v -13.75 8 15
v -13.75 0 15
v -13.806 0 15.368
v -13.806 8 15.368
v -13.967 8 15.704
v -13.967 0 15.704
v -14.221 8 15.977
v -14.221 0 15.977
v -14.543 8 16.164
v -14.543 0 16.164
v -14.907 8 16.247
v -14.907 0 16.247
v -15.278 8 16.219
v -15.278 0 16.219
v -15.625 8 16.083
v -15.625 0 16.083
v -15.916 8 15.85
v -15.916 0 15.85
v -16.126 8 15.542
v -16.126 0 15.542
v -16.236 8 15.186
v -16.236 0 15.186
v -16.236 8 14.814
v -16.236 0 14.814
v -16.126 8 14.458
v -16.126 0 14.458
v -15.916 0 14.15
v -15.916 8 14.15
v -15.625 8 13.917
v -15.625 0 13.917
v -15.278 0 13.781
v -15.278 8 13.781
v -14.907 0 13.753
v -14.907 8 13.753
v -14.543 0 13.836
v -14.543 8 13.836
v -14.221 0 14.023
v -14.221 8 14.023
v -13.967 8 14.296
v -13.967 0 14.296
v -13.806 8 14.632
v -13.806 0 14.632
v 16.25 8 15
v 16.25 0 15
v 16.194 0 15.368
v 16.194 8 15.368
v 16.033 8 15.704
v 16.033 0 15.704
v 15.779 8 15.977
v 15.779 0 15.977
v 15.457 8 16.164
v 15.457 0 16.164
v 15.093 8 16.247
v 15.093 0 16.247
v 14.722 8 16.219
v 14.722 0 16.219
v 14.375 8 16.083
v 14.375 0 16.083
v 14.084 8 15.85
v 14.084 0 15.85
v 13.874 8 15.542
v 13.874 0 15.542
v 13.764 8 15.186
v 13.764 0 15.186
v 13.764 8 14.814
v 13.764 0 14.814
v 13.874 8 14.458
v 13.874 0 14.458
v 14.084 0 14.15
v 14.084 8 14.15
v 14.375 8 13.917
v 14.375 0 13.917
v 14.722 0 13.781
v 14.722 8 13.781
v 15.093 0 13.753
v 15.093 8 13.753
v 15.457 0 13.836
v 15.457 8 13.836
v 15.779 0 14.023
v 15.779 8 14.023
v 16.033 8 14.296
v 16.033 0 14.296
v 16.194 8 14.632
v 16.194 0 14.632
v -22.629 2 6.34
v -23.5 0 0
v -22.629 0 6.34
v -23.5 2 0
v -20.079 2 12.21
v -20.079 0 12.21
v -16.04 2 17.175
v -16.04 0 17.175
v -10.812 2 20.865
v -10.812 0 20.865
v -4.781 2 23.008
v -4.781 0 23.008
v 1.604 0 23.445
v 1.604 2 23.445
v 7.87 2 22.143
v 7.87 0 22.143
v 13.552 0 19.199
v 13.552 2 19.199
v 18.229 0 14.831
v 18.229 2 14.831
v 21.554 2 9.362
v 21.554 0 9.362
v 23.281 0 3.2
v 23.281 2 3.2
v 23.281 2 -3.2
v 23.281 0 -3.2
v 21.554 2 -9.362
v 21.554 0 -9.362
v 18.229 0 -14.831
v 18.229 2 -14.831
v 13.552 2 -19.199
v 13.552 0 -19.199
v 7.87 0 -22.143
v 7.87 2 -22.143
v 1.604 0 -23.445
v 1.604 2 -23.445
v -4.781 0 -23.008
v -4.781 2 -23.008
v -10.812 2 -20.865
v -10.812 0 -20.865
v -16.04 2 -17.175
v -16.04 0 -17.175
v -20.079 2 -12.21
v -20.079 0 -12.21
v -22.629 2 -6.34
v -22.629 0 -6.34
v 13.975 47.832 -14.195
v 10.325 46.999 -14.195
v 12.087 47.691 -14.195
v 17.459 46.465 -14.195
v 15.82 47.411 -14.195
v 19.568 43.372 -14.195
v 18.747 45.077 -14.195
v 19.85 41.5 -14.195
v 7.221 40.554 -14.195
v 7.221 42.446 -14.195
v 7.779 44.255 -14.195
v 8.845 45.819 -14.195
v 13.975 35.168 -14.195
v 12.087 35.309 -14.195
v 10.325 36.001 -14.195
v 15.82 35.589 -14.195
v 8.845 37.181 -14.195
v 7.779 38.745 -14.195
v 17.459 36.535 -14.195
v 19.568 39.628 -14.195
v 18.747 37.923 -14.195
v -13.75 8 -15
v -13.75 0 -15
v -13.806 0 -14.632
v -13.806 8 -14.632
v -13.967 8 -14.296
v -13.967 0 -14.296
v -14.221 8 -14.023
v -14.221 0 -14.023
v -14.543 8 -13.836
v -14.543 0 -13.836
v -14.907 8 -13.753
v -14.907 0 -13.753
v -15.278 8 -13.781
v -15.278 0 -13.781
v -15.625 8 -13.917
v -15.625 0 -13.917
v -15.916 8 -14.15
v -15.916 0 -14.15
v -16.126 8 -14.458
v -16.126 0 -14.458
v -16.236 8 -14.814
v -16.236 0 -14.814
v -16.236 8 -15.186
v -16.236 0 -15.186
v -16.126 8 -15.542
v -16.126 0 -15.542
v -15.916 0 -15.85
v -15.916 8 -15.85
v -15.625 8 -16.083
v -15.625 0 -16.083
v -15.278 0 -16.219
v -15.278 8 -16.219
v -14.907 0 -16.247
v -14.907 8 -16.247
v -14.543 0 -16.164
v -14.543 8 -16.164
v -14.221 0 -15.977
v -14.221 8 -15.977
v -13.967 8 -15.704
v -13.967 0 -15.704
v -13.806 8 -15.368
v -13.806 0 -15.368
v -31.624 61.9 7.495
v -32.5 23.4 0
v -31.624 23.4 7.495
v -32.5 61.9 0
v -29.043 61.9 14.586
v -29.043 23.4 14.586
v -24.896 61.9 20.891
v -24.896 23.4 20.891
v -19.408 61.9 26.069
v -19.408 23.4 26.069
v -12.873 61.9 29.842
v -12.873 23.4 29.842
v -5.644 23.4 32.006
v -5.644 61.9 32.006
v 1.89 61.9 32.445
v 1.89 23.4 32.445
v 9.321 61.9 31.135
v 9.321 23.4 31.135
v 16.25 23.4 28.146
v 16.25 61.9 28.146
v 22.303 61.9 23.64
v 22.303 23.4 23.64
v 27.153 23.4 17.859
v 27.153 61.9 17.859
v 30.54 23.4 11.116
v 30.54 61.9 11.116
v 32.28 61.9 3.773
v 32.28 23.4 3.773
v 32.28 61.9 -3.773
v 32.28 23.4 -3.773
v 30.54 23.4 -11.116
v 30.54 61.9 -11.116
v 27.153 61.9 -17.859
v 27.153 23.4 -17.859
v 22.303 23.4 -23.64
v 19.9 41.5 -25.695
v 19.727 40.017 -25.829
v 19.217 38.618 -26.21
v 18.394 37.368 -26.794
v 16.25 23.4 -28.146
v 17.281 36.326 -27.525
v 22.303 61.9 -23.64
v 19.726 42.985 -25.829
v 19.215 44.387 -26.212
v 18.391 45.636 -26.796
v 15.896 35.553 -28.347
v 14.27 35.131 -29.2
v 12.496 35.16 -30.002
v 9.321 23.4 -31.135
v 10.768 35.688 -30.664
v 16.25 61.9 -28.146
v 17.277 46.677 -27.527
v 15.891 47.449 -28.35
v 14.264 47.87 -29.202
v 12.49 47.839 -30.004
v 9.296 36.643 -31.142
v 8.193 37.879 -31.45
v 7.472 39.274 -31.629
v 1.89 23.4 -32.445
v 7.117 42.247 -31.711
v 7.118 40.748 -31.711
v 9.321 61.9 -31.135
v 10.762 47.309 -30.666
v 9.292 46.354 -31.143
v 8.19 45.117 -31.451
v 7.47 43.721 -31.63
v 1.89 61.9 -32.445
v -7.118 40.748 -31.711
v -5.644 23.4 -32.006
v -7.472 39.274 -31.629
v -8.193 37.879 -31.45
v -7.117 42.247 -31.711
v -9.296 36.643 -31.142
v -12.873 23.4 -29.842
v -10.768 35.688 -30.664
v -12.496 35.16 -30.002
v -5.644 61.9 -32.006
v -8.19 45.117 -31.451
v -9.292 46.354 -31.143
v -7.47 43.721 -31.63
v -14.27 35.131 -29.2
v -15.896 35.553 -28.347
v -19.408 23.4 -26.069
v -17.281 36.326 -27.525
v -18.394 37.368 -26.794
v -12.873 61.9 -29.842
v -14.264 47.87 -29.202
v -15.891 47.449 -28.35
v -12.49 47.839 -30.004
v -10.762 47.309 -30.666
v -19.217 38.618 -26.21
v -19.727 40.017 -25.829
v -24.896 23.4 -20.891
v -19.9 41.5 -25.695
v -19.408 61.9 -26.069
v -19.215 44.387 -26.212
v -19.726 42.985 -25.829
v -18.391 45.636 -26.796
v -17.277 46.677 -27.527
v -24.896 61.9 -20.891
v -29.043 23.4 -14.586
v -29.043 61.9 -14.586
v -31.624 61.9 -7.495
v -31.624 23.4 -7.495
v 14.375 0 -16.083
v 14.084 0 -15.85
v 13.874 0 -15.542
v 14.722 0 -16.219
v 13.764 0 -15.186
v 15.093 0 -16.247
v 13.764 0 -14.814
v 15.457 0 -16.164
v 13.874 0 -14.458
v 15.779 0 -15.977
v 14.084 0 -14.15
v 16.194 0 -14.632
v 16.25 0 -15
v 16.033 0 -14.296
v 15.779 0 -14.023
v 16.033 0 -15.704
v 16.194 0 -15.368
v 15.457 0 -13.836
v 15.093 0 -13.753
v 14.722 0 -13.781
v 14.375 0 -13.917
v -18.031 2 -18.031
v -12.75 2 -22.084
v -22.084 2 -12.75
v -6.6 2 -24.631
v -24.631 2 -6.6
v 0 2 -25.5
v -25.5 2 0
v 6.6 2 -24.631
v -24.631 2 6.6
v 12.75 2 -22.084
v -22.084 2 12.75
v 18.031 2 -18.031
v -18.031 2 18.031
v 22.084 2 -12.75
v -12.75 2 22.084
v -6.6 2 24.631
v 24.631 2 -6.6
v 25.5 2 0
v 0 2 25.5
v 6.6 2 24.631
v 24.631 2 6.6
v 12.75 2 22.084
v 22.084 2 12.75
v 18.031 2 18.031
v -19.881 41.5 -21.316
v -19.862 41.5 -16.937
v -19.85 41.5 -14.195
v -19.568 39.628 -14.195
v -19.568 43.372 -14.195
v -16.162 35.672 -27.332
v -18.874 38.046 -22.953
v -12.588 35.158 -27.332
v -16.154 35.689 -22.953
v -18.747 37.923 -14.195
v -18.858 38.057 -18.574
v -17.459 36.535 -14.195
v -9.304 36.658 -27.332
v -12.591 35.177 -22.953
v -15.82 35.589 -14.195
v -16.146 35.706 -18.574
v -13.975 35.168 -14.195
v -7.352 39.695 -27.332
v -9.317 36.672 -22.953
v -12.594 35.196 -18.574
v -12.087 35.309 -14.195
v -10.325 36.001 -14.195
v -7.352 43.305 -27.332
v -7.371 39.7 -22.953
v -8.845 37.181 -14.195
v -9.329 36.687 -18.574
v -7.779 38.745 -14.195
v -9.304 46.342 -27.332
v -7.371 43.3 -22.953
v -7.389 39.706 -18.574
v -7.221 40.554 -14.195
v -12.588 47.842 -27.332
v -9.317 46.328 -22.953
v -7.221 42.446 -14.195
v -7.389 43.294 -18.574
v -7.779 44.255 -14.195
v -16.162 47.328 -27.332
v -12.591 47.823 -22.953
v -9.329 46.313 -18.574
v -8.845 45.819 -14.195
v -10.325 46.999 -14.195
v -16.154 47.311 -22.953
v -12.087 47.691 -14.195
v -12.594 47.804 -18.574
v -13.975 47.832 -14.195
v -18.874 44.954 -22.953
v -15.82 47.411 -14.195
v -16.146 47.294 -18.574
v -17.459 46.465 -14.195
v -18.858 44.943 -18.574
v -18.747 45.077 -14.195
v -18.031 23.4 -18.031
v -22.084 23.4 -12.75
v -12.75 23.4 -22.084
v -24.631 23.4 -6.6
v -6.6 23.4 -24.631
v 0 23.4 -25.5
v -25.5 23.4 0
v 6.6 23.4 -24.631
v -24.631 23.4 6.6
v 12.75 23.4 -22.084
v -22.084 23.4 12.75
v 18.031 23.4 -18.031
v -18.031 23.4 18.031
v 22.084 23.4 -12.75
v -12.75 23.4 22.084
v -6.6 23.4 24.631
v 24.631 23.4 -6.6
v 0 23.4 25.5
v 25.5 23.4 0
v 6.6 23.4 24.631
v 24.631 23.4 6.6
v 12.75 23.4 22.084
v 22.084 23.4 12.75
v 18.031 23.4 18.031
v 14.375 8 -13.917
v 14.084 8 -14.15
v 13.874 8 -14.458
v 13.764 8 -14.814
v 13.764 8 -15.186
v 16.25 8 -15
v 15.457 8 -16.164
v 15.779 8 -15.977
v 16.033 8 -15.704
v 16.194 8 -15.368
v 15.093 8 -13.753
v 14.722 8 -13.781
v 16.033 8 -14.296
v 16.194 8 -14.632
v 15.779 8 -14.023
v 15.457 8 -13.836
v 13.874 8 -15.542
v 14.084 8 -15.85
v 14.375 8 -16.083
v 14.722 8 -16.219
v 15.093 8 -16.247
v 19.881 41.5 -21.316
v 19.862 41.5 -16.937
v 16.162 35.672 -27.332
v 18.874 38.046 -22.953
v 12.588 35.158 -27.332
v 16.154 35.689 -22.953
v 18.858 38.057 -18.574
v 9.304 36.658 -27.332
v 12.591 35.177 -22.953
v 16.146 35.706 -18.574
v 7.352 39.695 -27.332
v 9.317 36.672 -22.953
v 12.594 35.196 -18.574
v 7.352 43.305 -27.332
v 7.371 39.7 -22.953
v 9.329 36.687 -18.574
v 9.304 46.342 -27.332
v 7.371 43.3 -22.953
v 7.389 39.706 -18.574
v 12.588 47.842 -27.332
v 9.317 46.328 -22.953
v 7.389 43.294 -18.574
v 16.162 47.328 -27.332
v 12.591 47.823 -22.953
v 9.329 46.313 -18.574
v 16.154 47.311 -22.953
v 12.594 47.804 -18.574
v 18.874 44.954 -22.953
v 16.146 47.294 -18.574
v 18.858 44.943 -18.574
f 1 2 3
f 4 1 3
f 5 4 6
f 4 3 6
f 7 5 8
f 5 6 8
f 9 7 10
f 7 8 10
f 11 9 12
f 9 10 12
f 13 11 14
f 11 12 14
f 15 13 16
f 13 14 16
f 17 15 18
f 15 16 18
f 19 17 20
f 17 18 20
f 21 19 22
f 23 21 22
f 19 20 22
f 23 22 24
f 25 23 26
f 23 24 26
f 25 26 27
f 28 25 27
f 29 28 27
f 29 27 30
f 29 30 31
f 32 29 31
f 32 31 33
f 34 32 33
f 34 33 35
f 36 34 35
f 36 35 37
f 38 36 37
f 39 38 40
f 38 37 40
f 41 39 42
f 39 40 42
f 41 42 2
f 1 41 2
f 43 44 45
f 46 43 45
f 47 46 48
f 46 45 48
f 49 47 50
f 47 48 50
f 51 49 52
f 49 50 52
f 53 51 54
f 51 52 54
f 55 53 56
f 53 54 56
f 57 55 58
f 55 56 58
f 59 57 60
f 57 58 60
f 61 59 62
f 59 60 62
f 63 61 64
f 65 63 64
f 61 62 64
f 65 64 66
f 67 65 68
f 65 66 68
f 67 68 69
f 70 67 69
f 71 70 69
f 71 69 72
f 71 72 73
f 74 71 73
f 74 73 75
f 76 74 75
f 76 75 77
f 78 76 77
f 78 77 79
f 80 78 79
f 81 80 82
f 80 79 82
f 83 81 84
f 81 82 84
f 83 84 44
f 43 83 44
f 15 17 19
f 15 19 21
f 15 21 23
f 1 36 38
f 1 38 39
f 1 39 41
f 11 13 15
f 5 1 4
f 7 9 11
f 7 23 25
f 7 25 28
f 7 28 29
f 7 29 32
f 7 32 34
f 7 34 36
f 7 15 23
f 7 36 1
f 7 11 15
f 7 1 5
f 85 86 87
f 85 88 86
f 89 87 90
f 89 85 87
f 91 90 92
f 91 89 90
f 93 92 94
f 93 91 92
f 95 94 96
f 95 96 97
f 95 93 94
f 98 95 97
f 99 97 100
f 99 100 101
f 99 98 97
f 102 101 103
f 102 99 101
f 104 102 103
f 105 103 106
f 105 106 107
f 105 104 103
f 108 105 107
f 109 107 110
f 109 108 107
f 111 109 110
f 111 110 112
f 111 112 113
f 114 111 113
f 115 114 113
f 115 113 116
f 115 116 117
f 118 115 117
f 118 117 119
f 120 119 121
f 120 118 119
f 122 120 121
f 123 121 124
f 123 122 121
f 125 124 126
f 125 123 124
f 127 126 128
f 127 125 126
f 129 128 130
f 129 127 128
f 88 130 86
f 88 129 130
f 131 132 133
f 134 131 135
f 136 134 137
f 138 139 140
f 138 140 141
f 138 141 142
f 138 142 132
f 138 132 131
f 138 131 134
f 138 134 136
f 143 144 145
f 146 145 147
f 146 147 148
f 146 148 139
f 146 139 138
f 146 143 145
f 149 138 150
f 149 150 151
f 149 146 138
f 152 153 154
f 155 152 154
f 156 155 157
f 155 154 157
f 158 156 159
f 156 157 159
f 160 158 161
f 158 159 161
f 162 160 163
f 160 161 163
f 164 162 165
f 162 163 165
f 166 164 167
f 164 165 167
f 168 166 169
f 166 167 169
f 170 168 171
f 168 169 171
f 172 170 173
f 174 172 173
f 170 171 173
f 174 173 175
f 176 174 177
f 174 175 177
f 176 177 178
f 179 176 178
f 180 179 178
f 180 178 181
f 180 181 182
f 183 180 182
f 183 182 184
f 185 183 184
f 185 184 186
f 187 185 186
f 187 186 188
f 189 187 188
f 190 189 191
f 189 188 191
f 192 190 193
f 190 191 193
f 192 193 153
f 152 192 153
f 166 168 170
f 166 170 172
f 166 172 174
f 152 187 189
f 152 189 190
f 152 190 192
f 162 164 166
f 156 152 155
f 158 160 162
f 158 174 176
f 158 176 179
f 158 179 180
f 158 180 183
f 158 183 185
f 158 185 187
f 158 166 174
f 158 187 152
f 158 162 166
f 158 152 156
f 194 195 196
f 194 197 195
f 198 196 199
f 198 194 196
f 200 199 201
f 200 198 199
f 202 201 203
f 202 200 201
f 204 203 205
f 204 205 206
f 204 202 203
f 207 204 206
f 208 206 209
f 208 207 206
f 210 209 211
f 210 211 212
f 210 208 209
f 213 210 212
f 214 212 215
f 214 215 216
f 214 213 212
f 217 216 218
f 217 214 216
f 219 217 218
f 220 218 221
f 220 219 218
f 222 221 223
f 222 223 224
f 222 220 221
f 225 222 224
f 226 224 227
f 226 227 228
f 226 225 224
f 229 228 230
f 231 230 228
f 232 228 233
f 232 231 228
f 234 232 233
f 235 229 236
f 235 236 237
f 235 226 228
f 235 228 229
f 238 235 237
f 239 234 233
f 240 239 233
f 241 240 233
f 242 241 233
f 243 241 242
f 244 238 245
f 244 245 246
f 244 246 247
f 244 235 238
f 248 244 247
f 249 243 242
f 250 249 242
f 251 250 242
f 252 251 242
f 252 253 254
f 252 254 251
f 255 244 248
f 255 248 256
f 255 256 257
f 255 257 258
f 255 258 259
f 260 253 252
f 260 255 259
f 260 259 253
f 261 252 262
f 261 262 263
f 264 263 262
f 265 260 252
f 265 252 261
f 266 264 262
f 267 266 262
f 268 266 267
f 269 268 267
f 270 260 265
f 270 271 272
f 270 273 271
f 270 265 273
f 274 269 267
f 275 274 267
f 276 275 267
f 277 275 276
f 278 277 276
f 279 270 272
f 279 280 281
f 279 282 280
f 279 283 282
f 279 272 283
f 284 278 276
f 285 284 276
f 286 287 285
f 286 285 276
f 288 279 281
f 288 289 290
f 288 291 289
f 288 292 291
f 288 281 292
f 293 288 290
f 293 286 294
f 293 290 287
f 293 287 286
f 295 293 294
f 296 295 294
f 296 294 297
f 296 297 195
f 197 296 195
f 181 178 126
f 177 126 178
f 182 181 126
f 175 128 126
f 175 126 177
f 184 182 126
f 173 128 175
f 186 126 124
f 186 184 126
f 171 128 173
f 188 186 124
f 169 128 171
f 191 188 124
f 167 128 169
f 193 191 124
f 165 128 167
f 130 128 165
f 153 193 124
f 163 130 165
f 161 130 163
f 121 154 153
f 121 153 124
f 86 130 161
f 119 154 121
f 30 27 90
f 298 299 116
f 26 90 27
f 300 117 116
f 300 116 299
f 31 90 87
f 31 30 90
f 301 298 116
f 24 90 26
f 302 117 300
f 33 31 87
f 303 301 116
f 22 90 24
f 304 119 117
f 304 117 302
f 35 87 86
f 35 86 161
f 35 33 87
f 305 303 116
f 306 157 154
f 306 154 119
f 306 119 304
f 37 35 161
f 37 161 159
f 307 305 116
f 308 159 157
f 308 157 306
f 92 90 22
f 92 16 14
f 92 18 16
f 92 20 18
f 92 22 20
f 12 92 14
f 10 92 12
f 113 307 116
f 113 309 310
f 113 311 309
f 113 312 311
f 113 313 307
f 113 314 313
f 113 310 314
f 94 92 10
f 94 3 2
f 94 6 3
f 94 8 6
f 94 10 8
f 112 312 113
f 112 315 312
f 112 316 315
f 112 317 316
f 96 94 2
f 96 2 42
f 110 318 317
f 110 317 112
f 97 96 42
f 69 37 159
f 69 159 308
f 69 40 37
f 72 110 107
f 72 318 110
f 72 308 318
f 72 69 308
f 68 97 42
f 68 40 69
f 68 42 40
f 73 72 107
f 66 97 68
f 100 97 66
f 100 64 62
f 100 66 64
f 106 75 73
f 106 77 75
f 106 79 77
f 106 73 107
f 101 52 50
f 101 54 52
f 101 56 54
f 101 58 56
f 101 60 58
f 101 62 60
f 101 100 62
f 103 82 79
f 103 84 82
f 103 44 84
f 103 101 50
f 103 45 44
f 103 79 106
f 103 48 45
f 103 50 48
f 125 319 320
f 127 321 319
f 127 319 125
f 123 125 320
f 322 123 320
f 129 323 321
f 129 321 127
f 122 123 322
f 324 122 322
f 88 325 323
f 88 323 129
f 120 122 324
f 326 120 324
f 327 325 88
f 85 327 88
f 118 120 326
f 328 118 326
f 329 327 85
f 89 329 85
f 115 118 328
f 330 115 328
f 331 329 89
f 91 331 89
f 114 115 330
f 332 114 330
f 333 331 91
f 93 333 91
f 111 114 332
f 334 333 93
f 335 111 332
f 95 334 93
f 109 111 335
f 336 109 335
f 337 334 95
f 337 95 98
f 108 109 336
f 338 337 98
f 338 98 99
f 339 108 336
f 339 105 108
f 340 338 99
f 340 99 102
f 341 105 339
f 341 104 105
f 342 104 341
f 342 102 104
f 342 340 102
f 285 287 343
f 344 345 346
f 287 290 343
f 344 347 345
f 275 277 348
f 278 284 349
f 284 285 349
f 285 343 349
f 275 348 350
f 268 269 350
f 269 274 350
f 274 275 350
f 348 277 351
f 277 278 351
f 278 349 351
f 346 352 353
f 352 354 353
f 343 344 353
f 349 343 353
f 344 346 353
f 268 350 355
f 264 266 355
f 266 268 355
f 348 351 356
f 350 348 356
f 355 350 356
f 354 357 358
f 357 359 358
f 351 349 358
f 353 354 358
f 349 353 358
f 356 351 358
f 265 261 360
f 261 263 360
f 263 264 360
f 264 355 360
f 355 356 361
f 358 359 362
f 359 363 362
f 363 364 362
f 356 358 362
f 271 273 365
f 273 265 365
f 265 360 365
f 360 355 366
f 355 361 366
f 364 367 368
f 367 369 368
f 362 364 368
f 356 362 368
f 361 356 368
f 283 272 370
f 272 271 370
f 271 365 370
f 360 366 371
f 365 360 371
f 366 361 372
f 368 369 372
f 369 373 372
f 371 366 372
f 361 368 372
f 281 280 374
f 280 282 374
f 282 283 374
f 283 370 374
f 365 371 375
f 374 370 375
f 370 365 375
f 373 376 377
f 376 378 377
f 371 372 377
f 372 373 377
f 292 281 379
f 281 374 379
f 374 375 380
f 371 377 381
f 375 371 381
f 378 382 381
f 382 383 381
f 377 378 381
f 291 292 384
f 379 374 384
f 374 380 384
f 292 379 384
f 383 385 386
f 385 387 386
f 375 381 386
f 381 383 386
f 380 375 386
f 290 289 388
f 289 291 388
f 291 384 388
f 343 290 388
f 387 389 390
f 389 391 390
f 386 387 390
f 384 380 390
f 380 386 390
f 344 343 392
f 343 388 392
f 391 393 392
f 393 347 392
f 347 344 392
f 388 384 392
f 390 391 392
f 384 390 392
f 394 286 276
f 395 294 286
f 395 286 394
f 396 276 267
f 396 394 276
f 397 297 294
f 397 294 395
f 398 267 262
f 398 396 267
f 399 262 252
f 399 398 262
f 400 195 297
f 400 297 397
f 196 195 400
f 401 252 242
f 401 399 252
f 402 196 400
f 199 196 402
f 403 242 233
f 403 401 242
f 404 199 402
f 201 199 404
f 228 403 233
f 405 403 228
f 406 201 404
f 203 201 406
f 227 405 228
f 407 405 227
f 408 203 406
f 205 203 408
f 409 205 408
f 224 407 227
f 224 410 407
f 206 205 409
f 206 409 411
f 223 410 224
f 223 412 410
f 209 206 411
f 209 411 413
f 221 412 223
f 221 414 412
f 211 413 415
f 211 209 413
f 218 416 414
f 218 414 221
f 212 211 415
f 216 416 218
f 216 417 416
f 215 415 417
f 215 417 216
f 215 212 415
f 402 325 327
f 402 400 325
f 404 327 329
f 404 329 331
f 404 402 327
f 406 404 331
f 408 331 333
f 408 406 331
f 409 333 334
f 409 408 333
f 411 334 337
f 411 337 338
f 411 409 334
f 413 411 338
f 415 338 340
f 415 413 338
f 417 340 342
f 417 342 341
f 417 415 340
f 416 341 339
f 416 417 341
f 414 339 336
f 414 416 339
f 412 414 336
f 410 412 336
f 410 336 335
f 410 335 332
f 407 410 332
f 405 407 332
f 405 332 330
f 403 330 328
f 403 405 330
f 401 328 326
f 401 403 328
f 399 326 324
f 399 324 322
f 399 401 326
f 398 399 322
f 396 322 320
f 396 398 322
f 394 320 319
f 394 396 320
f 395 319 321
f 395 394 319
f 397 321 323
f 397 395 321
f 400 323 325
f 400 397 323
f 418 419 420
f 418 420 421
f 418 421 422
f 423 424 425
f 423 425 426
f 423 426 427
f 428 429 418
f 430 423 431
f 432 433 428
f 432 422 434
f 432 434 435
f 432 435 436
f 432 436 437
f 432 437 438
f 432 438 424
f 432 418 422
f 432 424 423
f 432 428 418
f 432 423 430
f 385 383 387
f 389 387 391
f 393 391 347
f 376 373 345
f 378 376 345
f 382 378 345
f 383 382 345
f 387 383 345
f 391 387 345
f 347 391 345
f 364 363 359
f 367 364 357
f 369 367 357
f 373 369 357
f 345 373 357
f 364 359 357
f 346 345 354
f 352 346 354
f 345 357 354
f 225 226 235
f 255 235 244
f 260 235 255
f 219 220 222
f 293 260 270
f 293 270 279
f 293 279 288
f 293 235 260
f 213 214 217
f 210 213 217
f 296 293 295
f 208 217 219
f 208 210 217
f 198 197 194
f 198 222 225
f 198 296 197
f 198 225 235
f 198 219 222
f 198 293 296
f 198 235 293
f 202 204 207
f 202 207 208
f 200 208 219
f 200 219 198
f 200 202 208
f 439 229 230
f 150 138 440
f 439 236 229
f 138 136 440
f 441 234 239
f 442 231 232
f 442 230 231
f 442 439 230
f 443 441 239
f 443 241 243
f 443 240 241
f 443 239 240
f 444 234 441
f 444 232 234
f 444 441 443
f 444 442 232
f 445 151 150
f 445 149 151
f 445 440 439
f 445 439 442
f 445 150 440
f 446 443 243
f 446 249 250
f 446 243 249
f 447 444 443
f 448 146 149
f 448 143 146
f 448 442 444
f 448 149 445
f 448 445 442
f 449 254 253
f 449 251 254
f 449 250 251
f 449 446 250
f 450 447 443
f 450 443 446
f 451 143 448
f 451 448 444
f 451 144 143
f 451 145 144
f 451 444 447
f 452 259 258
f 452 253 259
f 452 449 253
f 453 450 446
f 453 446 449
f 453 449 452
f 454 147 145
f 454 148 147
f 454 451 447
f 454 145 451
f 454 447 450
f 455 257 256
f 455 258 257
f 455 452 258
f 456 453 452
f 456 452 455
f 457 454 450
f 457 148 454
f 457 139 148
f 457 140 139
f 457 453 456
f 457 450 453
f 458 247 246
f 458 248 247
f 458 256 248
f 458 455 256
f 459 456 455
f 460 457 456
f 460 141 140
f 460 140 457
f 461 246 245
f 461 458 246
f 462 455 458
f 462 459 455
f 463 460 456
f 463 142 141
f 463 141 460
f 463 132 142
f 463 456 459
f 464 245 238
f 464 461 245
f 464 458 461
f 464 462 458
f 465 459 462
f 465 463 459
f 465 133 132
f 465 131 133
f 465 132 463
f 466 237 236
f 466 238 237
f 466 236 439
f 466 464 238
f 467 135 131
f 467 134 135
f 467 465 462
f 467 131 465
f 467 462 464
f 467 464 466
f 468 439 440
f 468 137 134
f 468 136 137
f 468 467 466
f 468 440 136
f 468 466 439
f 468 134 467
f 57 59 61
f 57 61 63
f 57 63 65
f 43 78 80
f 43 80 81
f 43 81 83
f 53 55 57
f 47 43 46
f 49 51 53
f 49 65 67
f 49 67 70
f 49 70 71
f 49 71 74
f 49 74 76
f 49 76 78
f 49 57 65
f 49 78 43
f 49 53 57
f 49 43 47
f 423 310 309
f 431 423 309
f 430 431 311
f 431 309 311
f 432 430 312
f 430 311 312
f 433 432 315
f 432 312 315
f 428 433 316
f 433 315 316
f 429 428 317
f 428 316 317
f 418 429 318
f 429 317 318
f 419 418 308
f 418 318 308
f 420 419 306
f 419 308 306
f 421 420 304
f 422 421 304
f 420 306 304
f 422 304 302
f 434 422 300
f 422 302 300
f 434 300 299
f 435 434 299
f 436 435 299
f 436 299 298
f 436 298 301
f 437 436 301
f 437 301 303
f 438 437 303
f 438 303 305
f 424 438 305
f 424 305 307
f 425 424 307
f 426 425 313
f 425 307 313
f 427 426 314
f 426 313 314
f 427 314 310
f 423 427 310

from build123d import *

# Parameters (mm, degrees)
SKETCH3_R          = 1.25
CUT_EXTRUDE1_DEPTH = 8


with BuildPart() as part:
    # Sketch1 → Revolve1 (revolve)
    with BuildSketch(Plane.XY):
        Polygon((0, 0), (-23.5, 0), (-23.5, 2), (-25.5, 2), (-25.5, 23.4), (-32.5, 23.4), (-32.5, 61.9), (0, 61.9), align=None)
    revolve(axis=Axis((0, -426.088089194, 0), (0, 1, 0)))

    # Sketch2 → Cut-Revolve1 (revolve, cut)
    with BuildSketch(Plane(origin=(0, 41.5, 0), x_dir=(-1, 0, 0), z_dir=(0, -1, 0))):
        Polygon((-19.929871148, 32.5), (-19.85, 14.194997457), (-13.5, 14.194997457), (-13.5, 32.5), align=None)
    cut_revolve1 = revolve(axis=Axis((13.5, 41.5, 985.805002543), (0, 0, -1)), mode=Mode.SUBTRACT)

    # Mirror1: Cut-Revolve1 across plane
    add(cut_revolve1.mirror(Plane(origin=(0, 0, 0), x_dir=(0, 0, 1), z_dir=(1, 0, 0))), mode=Mode.SUBTRACT)

    # Sketch3 → Cut-Extrude1 (cut)
    with BuildSketch(Plane.XZ):
        with Locations((-15, 15)):
            Circle(SKETCH3_R)
        with Locations((-15, -15)):
            Circle(SKETCH3_R)
        with Locations((15, -15)):
            Circle(SKETCH3_R)
        with Locations((15, 15)):
            Circle(SKETCH3_R)
    extrude(amount=-CUT_EXTRUDE1_DEPTH, mode=Mode.SUBTRACT)


solid = part.part
